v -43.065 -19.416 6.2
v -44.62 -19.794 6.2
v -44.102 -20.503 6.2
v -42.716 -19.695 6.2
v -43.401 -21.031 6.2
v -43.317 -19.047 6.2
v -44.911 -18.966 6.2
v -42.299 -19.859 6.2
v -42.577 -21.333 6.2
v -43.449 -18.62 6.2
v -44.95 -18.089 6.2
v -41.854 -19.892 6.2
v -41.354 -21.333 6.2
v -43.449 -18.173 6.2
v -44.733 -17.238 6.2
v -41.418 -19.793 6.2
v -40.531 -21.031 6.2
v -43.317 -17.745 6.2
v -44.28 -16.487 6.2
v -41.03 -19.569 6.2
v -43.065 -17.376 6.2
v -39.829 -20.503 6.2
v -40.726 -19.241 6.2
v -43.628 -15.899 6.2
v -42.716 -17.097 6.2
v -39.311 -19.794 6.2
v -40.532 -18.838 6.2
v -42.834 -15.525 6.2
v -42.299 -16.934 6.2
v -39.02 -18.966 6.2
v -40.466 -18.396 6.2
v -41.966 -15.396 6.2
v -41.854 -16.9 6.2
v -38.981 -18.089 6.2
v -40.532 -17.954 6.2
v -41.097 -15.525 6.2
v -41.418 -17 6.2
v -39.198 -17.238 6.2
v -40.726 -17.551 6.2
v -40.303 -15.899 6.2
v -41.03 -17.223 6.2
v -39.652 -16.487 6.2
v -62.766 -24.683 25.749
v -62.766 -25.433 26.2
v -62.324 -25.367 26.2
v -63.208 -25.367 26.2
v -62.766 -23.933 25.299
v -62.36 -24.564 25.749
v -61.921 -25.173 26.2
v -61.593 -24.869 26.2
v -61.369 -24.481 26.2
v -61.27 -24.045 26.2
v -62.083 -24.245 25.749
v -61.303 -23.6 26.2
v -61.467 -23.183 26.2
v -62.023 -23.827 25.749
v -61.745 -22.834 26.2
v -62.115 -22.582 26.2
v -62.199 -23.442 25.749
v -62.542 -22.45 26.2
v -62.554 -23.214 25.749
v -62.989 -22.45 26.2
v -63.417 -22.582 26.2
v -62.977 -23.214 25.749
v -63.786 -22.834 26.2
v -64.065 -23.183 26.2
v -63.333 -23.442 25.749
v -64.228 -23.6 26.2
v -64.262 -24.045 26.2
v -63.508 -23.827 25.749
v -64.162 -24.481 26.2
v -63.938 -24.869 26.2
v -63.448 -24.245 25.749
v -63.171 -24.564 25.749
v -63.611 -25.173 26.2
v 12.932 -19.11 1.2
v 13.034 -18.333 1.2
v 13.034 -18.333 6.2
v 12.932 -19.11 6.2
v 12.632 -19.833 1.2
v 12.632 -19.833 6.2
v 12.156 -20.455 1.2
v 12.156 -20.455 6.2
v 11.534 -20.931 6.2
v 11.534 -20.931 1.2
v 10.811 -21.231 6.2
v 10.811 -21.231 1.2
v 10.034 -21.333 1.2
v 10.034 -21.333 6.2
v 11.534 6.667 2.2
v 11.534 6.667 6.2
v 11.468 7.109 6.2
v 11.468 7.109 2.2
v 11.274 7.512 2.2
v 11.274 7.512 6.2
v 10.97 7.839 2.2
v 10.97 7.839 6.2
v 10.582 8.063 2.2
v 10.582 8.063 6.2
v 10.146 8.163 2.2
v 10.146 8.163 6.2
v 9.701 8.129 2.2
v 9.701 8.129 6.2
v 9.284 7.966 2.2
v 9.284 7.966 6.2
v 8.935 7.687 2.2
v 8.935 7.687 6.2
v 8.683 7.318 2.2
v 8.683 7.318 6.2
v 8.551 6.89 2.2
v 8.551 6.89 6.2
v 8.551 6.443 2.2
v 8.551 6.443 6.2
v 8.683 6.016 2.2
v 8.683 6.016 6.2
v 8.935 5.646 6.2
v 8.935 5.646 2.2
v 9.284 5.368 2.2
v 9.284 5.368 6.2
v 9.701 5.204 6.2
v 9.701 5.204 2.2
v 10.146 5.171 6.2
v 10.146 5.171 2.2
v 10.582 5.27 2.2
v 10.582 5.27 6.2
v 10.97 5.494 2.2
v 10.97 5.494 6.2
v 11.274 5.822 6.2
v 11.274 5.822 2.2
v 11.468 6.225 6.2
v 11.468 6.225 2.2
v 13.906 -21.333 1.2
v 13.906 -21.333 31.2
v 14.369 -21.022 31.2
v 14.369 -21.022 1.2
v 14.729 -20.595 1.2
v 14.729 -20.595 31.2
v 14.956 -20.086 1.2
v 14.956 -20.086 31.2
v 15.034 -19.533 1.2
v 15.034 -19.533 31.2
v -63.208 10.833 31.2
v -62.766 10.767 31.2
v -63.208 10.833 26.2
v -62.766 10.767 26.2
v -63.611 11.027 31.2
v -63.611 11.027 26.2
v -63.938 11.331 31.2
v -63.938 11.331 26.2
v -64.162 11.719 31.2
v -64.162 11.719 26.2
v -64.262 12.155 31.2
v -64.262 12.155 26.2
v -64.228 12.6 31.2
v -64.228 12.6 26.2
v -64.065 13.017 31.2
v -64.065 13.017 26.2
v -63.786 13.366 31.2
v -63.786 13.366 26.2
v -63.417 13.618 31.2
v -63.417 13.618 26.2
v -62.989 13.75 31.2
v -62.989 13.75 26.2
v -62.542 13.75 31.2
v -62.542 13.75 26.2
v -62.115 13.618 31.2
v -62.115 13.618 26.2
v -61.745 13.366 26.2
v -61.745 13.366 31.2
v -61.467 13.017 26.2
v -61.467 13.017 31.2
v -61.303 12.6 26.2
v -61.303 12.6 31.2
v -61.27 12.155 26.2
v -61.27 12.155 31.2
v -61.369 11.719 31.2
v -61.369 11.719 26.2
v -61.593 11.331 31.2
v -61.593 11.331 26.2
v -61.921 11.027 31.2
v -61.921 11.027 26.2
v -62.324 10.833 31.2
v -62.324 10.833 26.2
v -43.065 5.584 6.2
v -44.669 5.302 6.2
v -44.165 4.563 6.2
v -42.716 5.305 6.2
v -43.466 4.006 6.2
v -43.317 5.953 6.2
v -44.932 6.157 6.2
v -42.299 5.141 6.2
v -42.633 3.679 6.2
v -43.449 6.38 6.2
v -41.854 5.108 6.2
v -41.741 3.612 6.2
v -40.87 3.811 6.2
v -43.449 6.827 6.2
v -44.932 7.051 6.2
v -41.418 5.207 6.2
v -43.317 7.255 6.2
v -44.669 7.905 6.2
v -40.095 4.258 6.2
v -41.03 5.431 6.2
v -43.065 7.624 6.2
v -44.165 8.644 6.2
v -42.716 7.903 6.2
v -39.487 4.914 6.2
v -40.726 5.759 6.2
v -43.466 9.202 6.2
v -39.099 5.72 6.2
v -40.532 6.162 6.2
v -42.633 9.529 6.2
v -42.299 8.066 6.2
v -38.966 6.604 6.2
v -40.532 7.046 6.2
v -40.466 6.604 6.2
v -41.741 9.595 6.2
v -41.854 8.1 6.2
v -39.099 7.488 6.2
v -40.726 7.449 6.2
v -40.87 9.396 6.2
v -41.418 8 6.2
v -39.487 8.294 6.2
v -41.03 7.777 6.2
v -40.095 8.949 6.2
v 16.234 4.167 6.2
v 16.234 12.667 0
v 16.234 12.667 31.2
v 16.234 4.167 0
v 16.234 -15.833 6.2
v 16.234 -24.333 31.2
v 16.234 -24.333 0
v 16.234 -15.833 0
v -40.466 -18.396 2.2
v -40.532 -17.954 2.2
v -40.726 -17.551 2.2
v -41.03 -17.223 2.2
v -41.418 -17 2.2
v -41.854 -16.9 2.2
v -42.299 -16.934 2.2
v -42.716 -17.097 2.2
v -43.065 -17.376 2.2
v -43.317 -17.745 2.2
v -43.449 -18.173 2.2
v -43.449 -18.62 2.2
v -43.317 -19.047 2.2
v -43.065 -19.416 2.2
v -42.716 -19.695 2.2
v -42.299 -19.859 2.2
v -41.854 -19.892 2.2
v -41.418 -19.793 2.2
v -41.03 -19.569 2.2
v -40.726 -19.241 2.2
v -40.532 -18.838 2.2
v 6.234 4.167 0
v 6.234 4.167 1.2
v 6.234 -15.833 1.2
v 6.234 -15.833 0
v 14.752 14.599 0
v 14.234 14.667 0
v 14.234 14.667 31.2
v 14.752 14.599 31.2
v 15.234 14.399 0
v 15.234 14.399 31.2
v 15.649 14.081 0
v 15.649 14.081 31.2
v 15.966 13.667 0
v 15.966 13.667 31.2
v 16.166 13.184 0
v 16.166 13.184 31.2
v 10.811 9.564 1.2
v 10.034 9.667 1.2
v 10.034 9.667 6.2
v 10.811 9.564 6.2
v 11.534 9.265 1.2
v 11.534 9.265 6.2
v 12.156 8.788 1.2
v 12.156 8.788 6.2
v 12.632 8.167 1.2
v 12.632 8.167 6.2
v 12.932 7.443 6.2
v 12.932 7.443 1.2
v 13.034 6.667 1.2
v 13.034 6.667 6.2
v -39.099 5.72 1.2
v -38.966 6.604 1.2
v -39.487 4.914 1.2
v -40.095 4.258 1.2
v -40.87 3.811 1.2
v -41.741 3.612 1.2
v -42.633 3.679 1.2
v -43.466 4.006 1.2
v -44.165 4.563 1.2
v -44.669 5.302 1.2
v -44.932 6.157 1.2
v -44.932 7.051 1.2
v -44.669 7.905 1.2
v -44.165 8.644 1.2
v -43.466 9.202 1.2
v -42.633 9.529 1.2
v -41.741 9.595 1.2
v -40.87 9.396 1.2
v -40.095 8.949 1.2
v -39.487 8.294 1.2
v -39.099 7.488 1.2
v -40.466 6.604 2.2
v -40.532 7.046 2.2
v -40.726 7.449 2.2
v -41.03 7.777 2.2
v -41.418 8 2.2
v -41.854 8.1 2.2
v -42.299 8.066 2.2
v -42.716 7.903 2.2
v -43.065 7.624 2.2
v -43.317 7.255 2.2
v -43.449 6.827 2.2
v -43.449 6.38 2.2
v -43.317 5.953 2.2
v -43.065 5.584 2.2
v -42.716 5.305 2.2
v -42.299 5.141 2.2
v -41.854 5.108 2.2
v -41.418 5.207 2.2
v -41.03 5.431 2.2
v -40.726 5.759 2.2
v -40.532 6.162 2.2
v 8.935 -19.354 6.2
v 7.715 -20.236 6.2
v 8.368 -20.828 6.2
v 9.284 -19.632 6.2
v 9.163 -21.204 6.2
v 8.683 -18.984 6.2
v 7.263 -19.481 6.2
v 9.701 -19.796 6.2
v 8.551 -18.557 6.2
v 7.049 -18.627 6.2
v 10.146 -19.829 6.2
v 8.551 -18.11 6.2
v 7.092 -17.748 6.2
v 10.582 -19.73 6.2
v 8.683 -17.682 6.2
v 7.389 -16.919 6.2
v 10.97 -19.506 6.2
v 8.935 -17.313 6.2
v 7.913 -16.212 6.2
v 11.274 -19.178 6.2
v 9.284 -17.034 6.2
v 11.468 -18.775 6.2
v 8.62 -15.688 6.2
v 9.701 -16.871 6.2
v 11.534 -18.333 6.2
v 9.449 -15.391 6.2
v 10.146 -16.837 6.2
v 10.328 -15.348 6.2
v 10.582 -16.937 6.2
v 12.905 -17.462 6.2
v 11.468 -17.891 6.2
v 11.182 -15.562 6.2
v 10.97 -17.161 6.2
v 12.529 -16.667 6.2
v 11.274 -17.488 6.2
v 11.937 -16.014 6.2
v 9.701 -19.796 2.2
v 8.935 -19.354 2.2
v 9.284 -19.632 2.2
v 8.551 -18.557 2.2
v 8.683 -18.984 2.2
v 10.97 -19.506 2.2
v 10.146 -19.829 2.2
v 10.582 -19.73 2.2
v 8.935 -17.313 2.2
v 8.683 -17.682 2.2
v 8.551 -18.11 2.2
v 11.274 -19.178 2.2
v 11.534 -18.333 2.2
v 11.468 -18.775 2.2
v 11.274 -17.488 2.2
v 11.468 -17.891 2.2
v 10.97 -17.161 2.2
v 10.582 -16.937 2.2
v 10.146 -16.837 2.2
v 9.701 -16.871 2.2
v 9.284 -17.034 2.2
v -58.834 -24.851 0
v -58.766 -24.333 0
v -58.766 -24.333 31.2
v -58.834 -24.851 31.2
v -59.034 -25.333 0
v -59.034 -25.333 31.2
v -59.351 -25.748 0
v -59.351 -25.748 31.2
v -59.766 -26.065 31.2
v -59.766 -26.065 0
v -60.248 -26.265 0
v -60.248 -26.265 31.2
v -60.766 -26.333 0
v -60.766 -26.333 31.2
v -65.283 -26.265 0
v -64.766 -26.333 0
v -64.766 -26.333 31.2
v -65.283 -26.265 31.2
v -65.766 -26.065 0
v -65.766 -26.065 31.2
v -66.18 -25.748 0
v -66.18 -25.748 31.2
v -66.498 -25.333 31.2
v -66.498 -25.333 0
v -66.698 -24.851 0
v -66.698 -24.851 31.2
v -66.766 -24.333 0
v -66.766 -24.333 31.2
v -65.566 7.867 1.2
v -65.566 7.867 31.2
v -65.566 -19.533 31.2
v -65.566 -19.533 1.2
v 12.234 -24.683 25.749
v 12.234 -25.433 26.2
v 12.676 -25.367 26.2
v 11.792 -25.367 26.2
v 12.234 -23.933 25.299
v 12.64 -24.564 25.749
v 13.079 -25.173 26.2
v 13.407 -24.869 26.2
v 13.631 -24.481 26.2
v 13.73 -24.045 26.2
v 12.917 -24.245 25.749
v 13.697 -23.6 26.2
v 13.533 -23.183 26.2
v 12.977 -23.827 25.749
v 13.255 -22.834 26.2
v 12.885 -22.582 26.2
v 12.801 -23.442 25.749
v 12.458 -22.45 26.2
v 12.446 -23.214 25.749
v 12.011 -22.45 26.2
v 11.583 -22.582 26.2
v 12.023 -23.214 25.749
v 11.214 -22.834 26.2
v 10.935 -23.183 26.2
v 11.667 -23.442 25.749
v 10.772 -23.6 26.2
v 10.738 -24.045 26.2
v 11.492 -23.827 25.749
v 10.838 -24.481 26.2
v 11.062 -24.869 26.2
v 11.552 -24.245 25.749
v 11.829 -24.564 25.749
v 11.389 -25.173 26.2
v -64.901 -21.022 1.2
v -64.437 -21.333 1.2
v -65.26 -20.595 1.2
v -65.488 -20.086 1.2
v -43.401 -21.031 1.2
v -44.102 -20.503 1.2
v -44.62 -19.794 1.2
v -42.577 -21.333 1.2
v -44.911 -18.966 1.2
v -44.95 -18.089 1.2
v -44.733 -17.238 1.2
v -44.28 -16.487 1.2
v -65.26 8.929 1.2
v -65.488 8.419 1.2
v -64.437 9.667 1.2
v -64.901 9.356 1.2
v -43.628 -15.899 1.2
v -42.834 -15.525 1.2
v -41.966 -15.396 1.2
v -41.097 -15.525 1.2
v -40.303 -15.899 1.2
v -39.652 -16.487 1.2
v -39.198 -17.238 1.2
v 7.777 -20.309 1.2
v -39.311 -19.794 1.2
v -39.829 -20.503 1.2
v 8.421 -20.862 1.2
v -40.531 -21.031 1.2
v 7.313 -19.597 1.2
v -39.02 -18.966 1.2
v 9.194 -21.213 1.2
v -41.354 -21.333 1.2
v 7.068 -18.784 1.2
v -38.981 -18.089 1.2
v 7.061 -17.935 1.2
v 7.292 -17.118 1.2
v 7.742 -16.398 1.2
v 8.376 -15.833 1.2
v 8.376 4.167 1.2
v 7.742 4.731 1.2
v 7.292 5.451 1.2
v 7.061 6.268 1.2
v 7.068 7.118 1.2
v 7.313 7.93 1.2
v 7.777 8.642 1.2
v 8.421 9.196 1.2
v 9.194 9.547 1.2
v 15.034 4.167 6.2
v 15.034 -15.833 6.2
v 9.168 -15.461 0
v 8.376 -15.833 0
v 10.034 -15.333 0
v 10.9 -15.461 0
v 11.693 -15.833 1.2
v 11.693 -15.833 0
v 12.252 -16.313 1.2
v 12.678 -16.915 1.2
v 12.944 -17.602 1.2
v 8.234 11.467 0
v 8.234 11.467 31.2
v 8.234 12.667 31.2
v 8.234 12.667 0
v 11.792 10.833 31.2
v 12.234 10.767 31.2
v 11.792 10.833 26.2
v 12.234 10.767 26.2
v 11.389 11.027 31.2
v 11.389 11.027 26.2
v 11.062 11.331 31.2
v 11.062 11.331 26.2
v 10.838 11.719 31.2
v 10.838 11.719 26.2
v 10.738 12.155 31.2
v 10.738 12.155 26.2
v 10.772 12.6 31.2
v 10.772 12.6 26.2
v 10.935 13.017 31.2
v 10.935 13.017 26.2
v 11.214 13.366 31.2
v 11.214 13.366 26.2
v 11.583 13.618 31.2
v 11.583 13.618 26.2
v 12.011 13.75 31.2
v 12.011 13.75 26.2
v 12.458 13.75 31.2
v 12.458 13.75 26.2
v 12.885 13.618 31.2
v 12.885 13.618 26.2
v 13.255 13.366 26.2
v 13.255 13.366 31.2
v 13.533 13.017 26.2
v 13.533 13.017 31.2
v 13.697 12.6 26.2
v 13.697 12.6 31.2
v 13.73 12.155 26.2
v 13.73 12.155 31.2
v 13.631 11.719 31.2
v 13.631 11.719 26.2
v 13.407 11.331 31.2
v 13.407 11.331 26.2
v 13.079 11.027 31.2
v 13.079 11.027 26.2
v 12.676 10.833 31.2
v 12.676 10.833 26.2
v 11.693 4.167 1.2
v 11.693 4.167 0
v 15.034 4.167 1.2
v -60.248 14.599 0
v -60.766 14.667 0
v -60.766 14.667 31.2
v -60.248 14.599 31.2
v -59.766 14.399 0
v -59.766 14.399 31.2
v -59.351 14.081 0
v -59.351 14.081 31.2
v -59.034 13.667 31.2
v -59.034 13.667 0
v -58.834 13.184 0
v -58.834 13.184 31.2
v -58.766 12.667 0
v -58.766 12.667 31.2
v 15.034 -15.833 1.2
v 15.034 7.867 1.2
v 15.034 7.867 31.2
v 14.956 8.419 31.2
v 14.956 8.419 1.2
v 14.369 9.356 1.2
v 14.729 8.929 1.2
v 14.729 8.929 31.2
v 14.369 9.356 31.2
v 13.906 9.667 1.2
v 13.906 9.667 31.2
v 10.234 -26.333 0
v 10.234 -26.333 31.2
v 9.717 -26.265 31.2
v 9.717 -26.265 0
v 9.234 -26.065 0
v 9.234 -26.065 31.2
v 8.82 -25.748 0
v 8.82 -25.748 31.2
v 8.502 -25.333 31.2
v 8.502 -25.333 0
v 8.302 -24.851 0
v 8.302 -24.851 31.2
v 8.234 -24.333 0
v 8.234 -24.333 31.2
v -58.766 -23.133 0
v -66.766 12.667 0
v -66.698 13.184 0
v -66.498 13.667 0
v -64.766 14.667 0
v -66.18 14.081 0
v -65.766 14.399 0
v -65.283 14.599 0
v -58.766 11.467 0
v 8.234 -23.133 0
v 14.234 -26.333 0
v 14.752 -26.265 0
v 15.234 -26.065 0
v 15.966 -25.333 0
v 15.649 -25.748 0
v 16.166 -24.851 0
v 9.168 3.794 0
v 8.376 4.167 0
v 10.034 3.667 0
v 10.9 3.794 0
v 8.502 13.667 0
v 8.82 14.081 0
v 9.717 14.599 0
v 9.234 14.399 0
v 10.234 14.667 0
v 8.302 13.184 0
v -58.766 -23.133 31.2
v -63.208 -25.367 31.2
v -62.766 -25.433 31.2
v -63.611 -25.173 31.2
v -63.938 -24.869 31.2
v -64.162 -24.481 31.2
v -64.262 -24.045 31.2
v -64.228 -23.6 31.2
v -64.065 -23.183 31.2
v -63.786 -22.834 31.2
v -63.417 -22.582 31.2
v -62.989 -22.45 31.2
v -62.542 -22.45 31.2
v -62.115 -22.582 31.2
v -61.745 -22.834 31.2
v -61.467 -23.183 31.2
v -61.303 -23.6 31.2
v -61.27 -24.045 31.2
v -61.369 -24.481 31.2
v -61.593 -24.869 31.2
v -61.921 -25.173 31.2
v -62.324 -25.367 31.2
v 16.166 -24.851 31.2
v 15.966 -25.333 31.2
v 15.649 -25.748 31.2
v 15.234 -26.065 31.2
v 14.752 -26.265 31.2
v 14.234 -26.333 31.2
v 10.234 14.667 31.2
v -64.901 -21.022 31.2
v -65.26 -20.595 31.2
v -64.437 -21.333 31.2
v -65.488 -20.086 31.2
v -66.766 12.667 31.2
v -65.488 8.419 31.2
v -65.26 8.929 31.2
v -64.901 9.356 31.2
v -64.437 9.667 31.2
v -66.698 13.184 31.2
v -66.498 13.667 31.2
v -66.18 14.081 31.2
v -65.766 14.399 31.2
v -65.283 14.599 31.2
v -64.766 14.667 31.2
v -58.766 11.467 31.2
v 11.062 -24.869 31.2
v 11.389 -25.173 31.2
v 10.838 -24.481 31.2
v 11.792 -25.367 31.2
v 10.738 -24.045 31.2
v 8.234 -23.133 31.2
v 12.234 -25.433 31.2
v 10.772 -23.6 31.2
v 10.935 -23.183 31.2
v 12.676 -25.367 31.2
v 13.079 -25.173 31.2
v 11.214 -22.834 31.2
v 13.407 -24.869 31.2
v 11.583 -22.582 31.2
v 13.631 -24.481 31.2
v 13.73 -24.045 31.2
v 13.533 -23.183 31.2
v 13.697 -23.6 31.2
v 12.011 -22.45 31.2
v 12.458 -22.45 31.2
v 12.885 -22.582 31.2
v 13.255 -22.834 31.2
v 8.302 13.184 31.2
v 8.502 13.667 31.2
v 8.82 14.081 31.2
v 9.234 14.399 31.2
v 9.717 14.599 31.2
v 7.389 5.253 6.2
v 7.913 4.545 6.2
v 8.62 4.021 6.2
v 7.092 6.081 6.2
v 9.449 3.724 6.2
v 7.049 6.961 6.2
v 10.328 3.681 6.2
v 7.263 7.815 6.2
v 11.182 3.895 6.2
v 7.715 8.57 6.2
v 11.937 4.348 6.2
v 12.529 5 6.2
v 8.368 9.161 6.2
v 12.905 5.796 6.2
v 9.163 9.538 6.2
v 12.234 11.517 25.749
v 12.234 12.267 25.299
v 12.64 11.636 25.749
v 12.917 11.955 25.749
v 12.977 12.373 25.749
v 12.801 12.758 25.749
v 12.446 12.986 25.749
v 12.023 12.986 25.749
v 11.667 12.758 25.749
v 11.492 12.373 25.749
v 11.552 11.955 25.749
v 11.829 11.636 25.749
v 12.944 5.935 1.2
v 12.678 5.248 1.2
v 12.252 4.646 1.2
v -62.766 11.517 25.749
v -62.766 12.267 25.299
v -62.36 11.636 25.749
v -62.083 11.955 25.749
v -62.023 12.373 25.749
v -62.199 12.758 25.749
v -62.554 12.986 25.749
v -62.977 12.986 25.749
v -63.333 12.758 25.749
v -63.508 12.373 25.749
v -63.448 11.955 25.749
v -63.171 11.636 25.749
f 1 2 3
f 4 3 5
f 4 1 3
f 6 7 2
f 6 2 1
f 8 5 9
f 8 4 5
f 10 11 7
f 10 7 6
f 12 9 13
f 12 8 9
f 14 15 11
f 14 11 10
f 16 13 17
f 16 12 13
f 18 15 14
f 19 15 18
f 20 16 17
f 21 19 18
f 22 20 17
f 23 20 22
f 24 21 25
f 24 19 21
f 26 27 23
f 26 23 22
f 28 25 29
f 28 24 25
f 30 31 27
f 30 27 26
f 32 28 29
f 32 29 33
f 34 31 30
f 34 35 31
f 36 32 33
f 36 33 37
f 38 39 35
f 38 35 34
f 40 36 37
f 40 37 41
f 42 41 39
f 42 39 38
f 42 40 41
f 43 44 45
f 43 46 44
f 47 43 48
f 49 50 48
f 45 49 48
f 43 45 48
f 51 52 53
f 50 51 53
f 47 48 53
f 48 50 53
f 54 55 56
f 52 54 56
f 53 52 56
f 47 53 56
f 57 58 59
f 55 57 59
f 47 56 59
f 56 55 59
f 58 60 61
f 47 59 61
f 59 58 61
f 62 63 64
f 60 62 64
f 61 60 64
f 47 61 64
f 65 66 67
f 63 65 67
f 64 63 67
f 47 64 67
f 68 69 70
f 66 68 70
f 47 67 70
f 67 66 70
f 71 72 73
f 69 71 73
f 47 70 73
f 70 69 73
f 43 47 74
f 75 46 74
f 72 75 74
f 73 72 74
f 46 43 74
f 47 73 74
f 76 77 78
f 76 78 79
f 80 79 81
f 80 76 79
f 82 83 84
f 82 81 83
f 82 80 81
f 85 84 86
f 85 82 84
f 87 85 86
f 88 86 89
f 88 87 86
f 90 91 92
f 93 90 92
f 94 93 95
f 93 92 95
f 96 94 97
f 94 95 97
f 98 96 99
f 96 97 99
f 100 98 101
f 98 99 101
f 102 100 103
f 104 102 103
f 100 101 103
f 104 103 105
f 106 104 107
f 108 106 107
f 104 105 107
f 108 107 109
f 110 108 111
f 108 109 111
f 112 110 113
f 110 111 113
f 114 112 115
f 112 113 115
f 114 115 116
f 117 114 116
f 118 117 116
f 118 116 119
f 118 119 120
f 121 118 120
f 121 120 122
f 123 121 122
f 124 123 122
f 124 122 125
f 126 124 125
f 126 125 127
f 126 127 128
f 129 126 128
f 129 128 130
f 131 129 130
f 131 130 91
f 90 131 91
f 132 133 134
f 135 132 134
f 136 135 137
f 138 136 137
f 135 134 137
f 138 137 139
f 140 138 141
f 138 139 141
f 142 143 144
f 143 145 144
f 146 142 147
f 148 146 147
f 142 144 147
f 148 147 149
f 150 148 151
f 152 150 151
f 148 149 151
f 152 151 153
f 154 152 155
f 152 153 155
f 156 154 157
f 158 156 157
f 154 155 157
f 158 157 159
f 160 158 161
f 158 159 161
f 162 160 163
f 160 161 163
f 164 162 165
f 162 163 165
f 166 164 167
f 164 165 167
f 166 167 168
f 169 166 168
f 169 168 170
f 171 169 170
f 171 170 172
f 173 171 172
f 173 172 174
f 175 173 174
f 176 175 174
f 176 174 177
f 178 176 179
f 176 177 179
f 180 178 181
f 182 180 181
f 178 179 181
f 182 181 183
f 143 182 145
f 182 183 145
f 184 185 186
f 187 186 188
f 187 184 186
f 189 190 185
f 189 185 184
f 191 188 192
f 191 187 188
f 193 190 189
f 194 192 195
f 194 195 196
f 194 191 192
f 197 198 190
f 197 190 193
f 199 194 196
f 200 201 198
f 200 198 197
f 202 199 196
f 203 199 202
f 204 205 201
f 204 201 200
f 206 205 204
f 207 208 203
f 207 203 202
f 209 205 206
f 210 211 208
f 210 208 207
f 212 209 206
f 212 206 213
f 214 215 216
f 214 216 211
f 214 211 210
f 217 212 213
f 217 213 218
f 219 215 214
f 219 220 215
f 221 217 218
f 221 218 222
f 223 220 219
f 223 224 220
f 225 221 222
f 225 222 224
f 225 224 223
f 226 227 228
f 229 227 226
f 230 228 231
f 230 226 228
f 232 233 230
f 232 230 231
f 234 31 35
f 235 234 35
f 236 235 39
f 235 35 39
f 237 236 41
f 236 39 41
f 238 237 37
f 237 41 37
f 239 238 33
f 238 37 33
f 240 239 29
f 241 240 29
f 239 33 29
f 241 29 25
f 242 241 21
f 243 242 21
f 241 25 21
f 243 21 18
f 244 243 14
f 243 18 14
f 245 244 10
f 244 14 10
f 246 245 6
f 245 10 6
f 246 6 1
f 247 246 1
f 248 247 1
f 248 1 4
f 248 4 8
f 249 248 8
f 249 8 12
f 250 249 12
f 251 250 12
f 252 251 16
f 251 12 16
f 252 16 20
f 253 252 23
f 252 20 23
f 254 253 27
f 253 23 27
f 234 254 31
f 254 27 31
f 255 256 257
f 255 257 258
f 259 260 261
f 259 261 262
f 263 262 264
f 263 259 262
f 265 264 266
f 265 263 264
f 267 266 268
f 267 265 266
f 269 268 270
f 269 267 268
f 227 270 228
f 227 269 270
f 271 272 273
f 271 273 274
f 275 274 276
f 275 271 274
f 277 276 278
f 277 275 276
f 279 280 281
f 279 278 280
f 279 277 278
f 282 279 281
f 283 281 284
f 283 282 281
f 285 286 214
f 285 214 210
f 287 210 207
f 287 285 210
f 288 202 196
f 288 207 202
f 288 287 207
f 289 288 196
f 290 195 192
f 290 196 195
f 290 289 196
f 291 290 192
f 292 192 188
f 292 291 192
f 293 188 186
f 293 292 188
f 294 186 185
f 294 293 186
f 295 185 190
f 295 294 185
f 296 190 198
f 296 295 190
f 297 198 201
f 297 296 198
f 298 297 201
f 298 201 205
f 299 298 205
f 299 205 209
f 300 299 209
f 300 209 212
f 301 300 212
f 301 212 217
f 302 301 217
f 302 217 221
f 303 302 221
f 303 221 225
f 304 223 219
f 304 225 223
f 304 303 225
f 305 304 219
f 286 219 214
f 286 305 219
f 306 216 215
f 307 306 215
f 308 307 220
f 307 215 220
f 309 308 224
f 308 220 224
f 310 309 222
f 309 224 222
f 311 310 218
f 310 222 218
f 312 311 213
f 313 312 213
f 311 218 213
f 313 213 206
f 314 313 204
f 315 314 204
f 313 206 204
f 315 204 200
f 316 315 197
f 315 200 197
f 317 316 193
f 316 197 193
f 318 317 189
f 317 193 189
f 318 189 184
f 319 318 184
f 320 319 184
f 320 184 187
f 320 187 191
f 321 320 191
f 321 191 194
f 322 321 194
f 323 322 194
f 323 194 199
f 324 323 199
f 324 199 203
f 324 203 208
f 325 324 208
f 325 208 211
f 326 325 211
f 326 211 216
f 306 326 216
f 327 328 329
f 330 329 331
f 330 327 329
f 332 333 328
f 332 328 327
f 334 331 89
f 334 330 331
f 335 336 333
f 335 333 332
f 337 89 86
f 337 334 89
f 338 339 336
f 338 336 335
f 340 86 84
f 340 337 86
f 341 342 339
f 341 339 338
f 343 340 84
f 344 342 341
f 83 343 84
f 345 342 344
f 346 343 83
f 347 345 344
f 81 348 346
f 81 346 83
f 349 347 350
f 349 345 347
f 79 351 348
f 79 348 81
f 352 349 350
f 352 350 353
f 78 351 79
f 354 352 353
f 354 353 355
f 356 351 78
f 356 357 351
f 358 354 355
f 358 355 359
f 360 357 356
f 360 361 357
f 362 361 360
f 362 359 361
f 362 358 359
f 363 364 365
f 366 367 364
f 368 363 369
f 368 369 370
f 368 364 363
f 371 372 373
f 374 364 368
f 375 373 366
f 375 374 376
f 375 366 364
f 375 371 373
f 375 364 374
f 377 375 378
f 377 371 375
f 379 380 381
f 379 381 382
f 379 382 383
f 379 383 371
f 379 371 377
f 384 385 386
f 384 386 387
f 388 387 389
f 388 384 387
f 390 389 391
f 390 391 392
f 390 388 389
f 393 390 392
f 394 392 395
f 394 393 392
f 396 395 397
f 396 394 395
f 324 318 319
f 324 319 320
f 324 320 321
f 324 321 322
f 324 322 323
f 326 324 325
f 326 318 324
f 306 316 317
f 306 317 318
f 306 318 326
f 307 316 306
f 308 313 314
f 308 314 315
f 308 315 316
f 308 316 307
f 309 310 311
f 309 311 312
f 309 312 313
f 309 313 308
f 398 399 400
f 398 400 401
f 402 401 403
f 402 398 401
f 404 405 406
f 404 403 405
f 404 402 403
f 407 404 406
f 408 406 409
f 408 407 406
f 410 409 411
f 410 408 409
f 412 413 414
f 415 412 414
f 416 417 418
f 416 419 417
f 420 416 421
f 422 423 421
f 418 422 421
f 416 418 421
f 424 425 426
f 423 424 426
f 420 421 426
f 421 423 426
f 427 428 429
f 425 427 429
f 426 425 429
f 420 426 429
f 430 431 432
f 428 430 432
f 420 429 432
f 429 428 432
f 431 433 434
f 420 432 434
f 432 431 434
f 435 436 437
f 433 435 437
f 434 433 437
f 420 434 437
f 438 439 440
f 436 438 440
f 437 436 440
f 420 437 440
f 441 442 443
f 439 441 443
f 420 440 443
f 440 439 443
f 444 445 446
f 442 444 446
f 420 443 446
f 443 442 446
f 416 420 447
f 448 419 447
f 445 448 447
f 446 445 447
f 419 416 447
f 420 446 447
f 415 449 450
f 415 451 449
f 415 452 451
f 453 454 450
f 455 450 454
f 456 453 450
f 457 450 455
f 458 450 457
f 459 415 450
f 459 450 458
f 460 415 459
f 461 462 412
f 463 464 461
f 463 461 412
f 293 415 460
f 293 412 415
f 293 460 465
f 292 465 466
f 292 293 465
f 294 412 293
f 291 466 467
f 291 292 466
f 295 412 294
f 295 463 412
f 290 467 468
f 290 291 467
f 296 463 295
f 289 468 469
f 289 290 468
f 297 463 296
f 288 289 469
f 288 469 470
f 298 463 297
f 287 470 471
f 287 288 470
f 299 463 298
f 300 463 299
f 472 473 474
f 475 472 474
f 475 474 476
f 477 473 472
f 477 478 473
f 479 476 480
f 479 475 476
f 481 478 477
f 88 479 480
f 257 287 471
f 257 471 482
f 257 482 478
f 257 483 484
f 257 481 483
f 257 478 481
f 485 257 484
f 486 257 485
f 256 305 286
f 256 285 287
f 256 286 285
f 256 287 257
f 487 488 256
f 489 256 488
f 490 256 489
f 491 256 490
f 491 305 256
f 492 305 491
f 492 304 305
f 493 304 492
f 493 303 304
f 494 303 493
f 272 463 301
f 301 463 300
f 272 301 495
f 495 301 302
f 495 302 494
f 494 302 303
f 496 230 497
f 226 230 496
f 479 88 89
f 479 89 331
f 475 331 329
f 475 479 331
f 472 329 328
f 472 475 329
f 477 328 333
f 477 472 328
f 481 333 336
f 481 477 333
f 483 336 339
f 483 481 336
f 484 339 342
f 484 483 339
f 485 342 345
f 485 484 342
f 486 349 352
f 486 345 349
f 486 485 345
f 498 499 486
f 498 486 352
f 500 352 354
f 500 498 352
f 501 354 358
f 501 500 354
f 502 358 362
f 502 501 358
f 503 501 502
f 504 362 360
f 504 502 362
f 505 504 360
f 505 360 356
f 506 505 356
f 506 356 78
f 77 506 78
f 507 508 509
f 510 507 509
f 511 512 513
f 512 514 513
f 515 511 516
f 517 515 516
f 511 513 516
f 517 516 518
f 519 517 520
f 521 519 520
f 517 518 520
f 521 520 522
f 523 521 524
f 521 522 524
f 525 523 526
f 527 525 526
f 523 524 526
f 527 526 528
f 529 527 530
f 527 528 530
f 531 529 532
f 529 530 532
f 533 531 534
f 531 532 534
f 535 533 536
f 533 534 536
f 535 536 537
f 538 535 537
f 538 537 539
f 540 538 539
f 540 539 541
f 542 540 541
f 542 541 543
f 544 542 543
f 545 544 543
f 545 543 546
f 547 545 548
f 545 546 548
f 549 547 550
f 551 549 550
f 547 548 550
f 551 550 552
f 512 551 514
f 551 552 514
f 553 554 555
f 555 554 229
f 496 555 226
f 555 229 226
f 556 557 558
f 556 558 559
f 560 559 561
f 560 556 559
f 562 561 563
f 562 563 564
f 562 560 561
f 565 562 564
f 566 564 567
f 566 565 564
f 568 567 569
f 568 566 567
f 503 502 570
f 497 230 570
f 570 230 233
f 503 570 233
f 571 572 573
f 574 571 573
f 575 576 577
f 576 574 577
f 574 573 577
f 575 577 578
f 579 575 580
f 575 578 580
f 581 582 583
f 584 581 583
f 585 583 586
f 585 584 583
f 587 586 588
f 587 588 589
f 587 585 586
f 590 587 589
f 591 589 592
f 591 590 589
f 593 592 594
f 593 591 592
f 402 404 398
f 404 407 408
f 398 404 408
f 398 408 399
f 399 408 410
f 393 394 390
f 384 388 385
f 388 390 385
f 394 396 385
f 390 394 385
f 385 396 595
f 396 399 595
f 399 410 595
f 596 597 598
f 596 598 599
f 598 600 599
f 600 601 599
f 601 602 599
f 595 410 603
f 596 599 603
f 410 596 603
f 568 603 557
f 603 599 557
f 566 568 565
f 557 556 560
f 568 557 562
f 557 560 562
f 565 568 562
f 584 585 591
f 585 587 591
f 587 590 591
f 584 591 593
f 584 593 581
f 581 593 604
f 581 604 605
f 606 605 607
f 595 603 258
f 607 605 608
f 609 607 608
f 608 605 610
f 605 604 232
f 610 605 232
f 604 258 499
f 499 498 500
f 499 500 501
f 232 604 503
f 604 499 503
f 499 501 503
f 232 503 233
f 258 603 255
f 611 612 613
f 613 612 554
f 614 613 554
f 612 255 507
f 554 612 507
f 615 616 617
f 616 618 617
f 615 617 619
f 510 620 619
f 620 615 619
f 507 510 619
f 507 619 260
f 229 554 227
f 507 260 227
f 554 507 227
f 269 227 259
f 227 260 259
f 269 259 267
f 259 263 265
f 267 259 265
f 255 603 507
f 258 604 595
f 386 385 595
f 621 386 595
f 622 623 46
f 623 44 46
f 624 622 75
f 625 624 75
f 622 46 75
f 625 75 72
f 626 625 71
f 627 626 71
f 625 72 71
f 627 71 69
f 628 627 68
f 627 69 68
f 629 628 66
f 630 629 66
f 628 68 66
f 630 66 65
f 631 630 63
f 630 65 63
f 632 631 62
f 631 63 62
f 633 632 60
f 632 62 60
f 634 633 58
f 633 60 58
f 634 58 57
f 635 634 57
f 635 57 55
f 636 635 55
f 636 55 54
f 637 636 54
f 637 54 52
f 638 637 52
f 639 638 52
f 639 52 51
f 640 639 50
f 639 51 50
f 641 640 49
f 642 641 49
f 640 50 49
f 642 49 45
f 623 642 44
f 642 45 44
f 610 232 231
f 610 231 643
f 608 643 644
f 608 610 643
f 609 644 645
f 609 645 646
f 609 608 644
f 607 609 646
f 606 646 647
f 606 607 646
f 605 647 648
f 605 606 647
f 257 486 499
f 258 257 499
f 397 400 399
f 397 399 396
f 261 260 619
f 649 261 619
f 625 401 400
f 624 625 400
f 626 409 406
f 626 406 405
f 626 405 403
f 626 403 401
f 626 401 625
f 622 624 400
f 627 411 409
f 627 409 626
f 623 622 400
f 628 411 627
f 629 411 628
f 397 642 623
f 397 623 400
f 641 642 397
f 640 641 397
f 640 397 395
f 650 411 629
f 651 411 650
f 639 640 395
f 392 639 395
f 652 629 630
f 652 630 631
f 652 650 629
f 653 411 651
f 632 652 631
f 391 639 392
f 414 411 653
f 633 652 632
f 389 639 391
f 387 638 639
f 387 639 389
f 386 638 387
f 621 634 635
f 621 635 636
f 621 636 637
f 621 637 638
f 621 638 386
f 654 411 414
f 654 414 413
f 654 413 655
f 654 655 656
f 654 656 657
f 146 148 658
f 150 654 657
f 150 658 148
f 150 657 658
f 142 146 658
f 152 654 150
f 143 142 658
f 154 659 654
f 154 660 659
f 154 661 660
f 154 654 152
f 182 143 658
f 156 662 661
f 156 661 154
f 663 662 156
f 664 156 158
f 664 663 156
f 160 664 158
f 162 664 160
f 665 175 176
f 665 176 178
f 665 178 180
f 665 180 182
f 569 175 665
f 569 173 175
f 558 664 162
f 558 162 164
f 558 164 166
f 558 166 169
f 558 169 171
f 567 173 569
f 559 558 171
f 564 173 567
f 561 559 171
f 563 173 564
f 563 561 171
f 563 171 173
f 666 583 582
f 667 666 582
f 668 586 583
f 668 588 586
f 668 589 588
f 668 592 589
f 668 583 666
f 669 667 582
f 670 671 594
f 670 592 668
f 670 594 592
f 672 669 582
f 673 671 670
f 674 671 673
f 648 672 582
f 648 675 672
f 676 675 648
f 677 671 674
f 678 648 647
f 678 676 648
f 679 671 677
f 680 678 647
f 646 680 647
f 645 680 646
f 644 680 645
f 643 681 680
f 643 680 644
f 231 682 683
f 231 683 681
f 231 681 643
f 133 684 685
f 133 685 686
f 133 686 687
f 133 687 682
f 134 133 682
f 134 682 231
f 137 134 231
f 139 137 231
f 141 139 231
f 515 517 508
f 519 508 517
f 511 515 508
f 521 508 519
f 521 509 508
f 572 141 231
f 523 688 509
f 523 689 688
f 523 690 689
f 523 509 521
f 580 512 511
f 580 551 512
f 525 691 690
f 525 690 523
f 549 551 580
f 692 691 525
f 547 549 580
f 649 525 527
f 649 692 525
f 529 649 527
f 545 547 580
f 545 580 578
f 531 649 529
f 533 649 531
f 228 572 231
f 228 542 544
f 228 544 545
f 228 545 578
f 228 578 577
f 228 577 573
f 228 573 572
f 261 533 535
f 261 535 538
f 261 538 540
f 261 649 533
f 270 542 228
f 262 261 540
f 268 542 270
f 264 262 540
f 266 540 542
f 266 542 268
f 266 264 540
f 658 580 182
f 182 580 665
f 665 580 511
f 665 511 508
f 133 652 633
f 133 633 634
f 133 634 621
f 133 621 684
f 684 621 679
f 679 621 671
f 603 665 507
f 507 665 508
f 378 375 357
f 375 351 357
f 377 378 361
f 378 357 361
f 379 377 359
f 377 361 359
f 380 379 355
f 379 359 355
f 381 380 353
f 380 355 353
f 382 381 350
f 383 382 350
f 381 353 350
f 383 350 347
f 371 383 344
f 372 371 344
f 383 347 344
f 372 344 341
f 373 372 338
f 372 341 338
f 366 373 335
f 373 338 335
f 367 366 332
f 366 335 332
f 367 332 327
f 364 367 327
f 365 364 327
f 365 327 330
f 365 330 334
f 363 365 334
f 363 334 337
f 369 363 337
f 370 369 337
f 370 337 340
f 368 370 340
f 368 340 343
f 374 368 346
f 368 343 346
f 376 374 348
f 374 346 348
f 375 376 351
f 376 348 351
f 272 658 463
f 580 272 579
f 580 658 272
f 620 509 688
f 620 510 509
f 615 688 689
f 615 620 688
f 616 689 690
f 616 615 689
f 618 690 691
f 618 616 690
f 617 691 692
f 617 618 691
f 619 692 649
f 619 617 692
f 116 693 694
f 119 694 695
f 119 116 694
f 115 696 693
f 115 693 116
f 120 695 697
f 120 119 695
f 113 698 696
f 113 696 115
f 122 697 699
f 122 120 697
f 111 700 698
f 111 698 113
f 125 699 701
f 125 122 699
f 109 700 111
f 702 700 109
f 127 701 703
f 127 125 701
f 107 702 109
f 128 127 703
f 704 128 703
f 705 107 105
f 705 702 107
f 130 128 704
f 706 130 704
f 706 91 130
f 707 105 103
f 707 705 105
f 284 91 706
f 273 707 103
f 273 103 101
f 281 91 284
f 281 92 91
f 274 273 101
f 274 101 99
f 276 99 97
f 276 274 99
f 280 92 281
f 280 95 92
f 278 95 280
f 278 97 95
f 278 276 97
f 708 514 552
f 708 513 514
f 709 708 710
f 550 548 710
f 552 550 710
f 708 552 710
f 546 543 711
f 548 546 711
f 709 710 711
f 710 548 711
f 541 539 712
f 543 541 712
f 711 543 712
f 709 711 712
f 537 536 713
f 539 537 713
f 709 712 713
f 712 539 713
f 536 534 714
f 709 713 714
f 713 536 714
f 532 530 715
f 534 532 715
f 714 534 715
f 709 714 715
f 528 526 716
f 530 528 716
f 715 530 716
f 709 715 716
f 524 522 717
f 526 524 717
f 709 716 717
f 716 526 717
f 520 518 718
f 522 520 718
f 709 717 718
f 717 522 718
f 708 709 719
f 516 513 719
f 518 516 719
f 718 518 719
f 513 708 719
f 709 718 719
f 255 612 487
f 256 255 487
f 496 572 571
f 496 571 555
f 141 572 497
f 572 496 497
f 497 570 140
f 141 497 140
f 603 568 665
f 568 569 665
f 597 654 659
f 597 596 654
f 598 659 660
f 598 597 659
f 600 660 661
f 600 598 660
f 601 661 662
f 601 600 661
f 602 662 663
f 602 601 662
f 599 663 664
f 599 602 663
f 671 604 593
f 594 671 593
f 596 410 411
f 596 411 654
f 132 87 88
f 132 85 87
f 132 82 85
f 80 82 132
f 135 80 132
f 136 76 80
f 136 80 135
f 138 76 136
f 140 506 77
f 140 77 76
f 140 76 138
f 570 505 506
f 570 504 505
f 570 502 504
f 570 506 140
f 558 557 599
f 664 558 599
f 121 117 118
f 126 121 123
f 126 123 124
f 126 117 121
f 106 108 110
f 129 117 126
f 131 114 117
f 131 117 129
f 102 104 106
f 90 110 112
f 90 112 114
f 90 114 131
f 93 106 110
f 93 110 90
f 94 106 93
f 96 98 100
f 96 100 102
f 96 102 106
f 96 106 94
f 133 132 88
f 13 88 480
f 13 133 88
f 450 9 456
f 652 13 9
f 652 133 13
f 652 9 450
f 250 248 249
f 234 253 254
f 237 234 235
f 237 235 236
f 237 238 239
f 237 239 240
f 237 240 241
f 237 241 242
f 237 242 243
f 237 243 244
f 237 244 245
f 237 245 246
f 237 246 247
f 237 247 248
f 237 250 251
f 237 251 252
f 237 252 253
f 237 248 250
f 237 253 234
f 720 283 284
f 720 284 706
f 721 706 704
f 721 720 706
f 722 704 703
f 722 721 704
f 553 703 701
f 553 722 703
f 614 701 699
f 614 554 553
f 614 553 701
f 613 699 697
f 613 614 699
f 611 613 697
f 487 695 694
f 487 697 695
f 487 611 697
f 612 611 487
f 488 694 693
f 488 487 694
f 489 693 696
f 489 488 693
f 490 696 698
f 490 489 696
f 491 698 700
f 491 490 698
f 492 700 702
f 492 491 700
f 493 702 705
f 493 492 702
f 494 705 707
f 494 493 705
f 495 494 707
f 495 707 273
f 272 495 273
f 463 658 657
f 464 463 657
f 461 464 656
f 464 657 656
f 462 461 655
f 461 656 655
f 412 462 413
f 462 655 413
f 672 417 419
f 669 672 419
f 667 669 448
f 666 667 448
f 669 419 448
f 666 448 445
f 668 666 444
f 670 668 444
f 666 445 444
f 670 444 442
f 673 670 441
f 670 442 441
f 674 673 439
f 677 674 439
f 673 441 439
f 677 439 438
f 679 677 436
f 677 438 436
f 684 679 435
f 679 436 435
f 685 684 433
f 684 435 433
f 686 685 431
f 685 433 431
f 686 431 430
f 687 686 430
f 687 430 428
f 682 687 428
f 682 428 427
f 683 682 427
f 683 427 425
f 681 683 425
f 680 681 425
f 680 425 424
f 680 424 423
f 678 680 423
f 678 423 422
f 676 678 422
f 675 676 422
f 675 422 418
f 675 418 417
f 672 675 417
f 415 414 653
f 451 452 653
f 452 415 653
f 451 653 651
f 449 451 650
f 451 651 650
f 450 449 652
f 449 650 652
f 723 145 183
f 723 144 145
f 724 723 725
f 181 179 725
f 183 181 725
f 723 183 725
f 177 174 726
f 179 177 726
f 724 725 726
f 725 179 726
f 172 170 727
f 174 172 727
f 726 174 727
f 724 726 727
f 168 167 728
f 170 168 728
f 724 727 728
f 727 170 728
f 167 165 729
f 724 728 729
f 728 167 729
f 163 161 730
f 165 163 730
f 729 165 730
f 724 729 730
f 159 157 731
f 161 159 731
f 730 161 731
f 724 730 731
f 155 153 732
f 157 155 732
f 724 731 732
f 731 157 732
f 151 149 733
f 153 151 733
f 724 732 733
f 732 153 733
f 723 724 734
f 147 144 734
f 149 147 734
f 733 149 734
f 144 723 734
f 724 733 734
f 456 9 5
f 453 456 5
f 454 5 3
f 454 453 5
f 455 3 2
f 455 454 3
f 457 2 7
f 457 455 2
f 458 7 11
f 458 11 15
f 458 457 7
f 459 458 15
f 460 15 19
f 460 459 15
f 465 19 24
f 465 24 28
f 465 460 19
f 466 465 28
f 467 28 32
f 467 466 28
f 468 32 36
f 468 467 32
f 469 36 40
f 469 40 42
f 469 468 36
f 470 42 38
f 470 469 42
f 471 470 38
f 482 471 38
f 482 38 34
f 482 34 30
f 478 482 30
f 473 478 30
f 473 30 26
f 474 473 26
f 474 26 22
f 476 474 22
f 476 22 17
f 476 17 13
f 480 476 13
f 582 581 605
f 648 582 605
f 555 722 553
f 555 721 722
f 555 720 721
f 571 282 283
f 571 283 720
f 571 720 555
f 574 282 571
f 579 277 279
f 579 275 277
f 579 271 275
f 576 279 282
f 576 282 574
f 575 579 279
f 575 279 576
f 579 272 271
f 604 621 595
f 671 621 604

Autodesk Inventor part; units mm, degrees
ref_plane "YZ Plane" through (0, 0, 0) normal (1, 0, 0) x (0, 1, 0)
ref_plane "XZ Plane" through (0, 0, 0) normal (0, 1, 0) x (-1, 0, 0)
ref_plane "XY Plane" through (0, 0, 0) normal (0, 0, 1) x (1, 0, 0)
sketch "Sketch1" plane through (0, 0, 0) normal (0, 0, 1) x (1, 0, 0)
  line L0 (-66.7657, 11.6667) -> (16.2343, 11.6667)
  line L1 (16.2343, 11.6667) -> (16.2343, -23.3333)
  line L2 (16.2343, -23.3333) -> (-66.7657, -23.3333)
  line L3 (-66.7657, -23.3333) -> (-66.7657, 11.6667)
  point P0 (0, 0)
  dimension "d0" = 35
  dimension "d1" = 83
extrude "Extrusion1" add sketch "Sketch1" along normal blind 1.2
sketch "Sketch2" plane through (0, 0, 1.2) normal (0, 0, 1) x (1, 0, 0)
  line L0 (16.2343, -23.3333) -> (16.2343, 11.6667) projected
  line L1 (-66.7657, 11.6667) -> (16.2343, 11.6667)
  line L2 (16.2343, 11.6667) -> (16.2343, 9.8667)
  line L3 (16.2343, 9.8667) -> (-66.7657, 9.8667)
  line L4 (-66.7657, 9.8667) -> (-66.7657, 11.6667)
  line L5 (-66.7657, 11.6667) -> (-66.7657, -23.3333) projected
  line L6 (16.2343, -23.3333) -> (-66.7657, -23.3333)
  line L7 (-66.7657, -23.3333) -> (-66.7657, -21.5333)
  line L8 (-66.7657, -21.5333) -> (16.2343, -21.5333)
  line L9 (16.2343, -21.5333) -> (16.2343, -23.3333)
  line L10 (-66.7657, 9.8667) -> (-65.5657, 9.8667)
  line L11 (-65.5657, 9.8667) -> (-65.5657, -21.5333)
  line L12 (-65.5657, -21.5333) -> (-66.7657, -21.5333)
  line L13 (-66.7657, -21.5333) -> (-66.7657, 9.8667)
  line L14 (16.2343, 9.8667) -> (15.0343, 9.8667)
  line L15 (15.0343, 9.8667) -> (15.0343, -21.5333)
  line L16 (15.0343, -21.5333) -> (16.2343, -21.5333)
  line L17 (16.2343, -21.5333) -> (16.2343, 9.8667)
  line L18 (-66.7657, 11.6667) -> (-65.5657, 11.6667)
  line L19 (-65.5657, 11.6667) -> (-65.5657, -21.5333)
  line L20 (-65.5657, -21.5333) -> (-66.7657, -21.5333)
  line L21 (-66.7657, -21.5333) -> (-66.7657, 11.6667)
  line L22 (-66.7657, 11.6667) -> (16.2343, 11.6667)
  line L23 (16.2343, 11.6667) -> (16.2343, 9.8667)
  line L24 (16.2343, 9.8667) -> (-66.7657, 9.8667)
  line L25 (-66.7657, 9.8667) -> (-66.7657, 11.6667)
  point P0 (0, 0)
  dimension "d4" = 1.8
  dimension "d5" = 1.8
  dimension "d6" = 1.2
  dimension "d7" = 1.2
extrude "Extrusion2" add sketch "Sketch2" along normal blind 30 contours L6 L5 L8 L0 | L8 L15 L3 L0 | L3 L19 L1 L0 | L5 L3 L11 L8 | L4 L1 L19 L3
sketch "Sketch3" plane through (0, 0, 31.2) normal (0, 0, 1) x (1, 0, 0)
  point P0 (0, 0)
sketch "Sketch4" plane through (16.2343, -23.3333, 0) normal (1, 0, 0) x (0, 0, -1)
  line L0 (-1.2, 33.2) -> (-1.2, 1.8) projected
  line L1 (-1.2, 7.5) -> (-6.2, 7.5)
  line L2 (-6.2, 7.5) -> (-6.2, 27.5)
  line L3 (-6.2, 27.5) -> (-1.2, 27.5)
  line L4 (-1.2, 27.5) -> (-1.2, 7.5)
  line L5 (-1.2, 1.8) -> (-31.2, 1.8) projected
  line L6 (-1.2, 33.2) -> (-31.2, 33.2) projected
  line L7 (-6.2, 7.5) -> (0, 7.5)
  line L8 (0, 7.5) -> (0, 27.5)
  line L9 (0, 27.5) -> (-6.2, 27.5)
  line L10 (-6.2, 27.5) -> (-6.2, 7.5)
  line L11 (0, 35) -> (0, 0) projected
  point P0 (0, 23.3333)
  dimension "d10" = 20
  dimension "d11" = 5
  dimension "d12" = 5.7
  dimension "d13" = 5.7
extrude "Extrusion3" cut sketch "Sketch4" against normal blind 10
fillet "Fillet1" radius 2 8 edges at (-66.7657, 11.6667, 15.6) (-65.5657, 9.8667, 16.2) (-66.7657, -23.3333, 15.6) (-65.5657, -21.5333, 16.2) (15.0343, 9.8667, 16.2) (16.2343, 11.6667, 15.6) (16.2343, -23.3333, 15.6) (15.0343, -21.5333, 16.2)
sketch "Sketch5" plane through (0, 0, 1.2) normal (0, 0, 1) x (1, 0, 0)
  circle A0 centre (10.0343, 6.6667) radius 1.5
  circle A1 centre (10.0343, -18.3333) radius 1.5
  line L0 (15.0343, 7.8667) -> (15.0343, -19.5333) projected
  line L1 (13.0343, -21.5333) -> (-63.5657, -21.5333) projected
  line L2 (-63.5657, 9.8667) -> (13.0343, 9.8667) projected
  point P0 (0, 0)
  dimension "d17" = 3
  dimension "d18" = 3
  dimension "d19" = 25
  dimension "d20" = 5
  dimension "d21" = 5
  dimension "d22" = 3.2
  dimension "d23" = 3.2
extrude "Extrusion4" add sketch "Sketch5" along normal blind 5
sketch "Sketch6" plane through (0, 0, 1.2) normal (0, 0, 1) x (1, 0, 0)
  circle A0 centre (-41.9656, -18.3962) radius 1.5
  circle A1 centre (-41.9656, 6.6038) radius 1.5
  circle A2 centre (10.0343, 6.6667) radius 1.5 projected
  circle A3 centre (10.0343, -18.3333) radius 1.5 projected
  point P0 (0, 0)
  dimension "d26" = 3
  dimension "d27" = 3
  dimension "d28" = 25
  dimension "d29" = 52
  dimension "d30" = 52
extrude "Extrusion5" add sketch "Sketch6" along normal blind 5 contours A0 | A1
sketch "Sketch7" plane through (-41.9656, 6.6038, 6.2) normal (0, 0, 1) x (1, 0, 0)
  point P0 (41.9656, -6.6038)
sketch "Sketch8" plane through (0, 0, 1.2) normal (0, 0, 1) x (1, 0, 0)
  circle A0 centre (-41.9656, -18.3962) radius 1.5 projected
  circle A1 centre (-41.9656, -18.3962) radius 3
  circle A2 centre (-41.9656, 6.6038) radius 1.5 projected
  circle A3 centre (-41.9656, 6.6038) radius 3
  circle A4 centre (10.0343, -18.3333) radius 1.5 projected
  circle A5 centre (10.0343, -18.3333) radius 3
  circle A6 centre (10.0343, 6.6667) radius 1.5 projected
  circle A7 centre (10.0343, 6.6667) radius 3
  point P0 (0, 0)
  dimension "d33" = 6
  dimension "d34" = 6
  dimension "d35" = 6
  dimension "d36" = 6
extrude "Extrusion6" add sketch "Sketch8" along normal blind 5
sketch "Sketch9" plane through (0, 0, 1.2) normal (0, 0, 1) x (1, 0, 0)
  arc A0 (8.376, -15.8333) -> (11.6926, -15.8333) centre (10.0343, -18.3333) ccw projected
  circle A1 centre (10.0343, -18.3333) radius 3
  arc A2 (11.6926, 4.1667) -> (8.376, 4.1667) centre (10.0343, 6.6667) ccw projected
  circle A3 centre (10.0343, 6.6667) radius 3
  point P0 (0, 0)
  dimension "d39" = 6
  dimension "d40" = 6
extrude "Extrusion7" add sketch "Sketch9" against normal blind 1.2
sketch "Sketch10" plane through (-41.9656, -18.3962, 6.2) normal (0, 0, 1) x (1, 0, 0)
  circle A0 centre (0, 0) radius 3 projected
  circle A1 centre (0, 0) radius 1.5
  circle A2 centre (0, 25) radius 3 projected
  circle A3 centre (0, 25) radius 1.5
  circle A4 centre (52, 0.0629) radius 3 projected
  circle A5 centre (52, 0.0629) radius 1.5
  circle A6 centre (52, 25.0629) radius 3 projected
  circle A7 centre (52, 25.0629) radius 1.5
  point P0 (41.9656, 18.3962)
  dimension "d43" = 3
  dimension "d44" = 3
  dimension "d45" = 3
  dimension "d46" = 3
extrude "Extrusion8" cut sketch "Sketch10" against normal blind 4 contours A1 | A3 | A5 | A7
thread "Thread1" size "M3x0.5" class "6H" standard "ANSI Metric M Profile" full length
thread "Thread2" size "M3x0.5" class "6H" standard "ANSI Metric M Profile" full length
thread "Thread3" size "M3x0.5" class "6H" standard "ANSI Metric M Profile" full length
thread "Thread4" size "M3x0.5" class "6H" standard "ANSI Metric M Profile" full length
sketch "Sketch11" plane through (0, 0, 31.2) normal (0, 0, 1) x (1, 0, 0)
  arc A0 (-64.7657, 11.6667) -> (-66.7657, 9.6667) centre (-64.7657, 9.6667) ccw projected
  line L0 (-66.7657, 9.6667) -> (16.2343, 9.6667)
  line L1 (16.2343, 9.6667) -> (16.2343, 14.6667)
  line L2 (16.2343, 14.6667) -> (-66.7657, 14.6667)
  line L3 (-66.7657, 14.6667) -> (-66.7657, 9.6667)
  line L4 (16.2343, -21.3333) -> (-66.7657, -21.3333)
  line L5 (-66.7657, -21.3333) -> (-66.7657, -26.3333)
  line L6 (-66.7657, -26.3333) -> (16.2343, -26.3333)
  line L7 (16.2343, -26.3333) -> (16.2343, -21.3333)
  point P0 (0, 0)
  dimension "d57" = 5
  dimension "d58" = 5
  dimension "d59" = 83
extrude "Extrusion9" add sketch "Sketch11" against normal blind 31.2
fillet "Fillet2" radius 2 4 edges at (16.2343, -26.3333, 15.6) (16.2343, 14.6667, 15.6) (-66.7657, 14.6667, 15.6) (-66.7657, -26.3333, 15.6)
sketch "Sketch12" plane through (0, 0, 31.2) normal (0, 0, 1) x (1, 0, 0)
  line L0 (14.2343, -26.3333) -> (-64.7657, -26.3333) projected
  line L1 (8.2343, -26.3333) -> (-58.7657, -26.3333)
  line L2 (-58.7657, -26.3333) -> (-58.7657, -23.1333)
  line L3 (-58.7657, -23.1333) -> (8.2343, -23.1333)
  line L4 (8.2343, -23.1333) -> (8.2343, -26.3333)
  line L5 (-64.7657, 14.6667) -> (14.2343, 14.6667) projected
  line L6 (8.2343, 14.6667) -> (-58.7657, 14.6667)
  line L7 (-58.7657, 14.6667) -> (-58.7657, 11.4667)
  line L8 (-58.7657, 11.4667) -> (8.2343, 11.4667)
  line L9 (8.2343, 11.4667) -> (8.2343, 14.6667)
  line L10 (16.2343, -24.3333) -> (16.2343, 12.6667) projected
  line L11 (-66.7657, 12.6667) -> (-66.7657, -24.3333) projected
  line L12 (13.9061, -21.3333) -> (-64.4375, -21.3333) projected
  line L13 (10.0343, 9.6667) -> (-64.4375, 9.6667) projected
  point P0 (0, 0)
  dimension "d63" = 8
  dimension "d64" = 8
  dimension "d65" = 1.8
  dimension "d66" = 1.8
extrude "Extrusion10" cut sketch "Sketch12" against normal blind 31.2
fillet "Fillet3" radius 2 4 edges at (8.2343, -26.3333, 15.6) (-58.7657, -26.3333, 15.6) (8.2343, 14.6667, 15.6) (-58.7657, 14.6667, 15.6)
sketch "Sketch13" plane through (0, 0, 31.2) normal (0, 0, 1) x (1, 0, 0)
  line L0 (14.2343, -26.3333) -> (10.2343, -26.3333) projected
  circle A0 centre (12.2343, -23.9333) radius 1.5
  circle A1 centre (-62.7657, -23.9333) radius 1.5
  line L1 (-64.7657, -26.3333) -> (-60.7657, -26.3333) projected
  circle A2 centre (12.2343, 12.2667) radius 1.5
  circle A3 centre (-62.7657, 12.2667) radius 1.5
  line L2 (-66.7657, 12.6667) -> (-66.7657, -24.3333) projected
  line L3 (-60.7657, 14.6667) -> (-64.7657, 14.6667) projected
  line L4 (16.2343, -24.3333) -> (16.2343, 12.6667) projected
  line L5 (14.2343, 14.6667) -> (10.2343, 14.6667) projected
  line L6 (8.2343, -23.1333) -> (8.2343, -24.3333) projected
  point P0 (0, 0)
  dimension "d70" = 2.4
  dimension "d71" = 3
  dimension "d72" = 3
  dimension "d73" = 2.4
  dimension "d74" = 3
  dimension "d75" = 3
  dimension "d76" = 4
  dimension "d77" = 4
  dimension "d78" = 2.4
  dimension "d79" = 4
  dimension "d80" = 2.4
  dimension "d81" = 4
hole "Hole1" at (12.2343, -23.9333, 31.2) at (12.2343, 12.2667, 31.2) at (-62.7657, -23.9333, 31.2) at (-62.7657, 12.2667, 31.2) direction (0, 0, -1) diameter 3 depth 5 tip angle 118
properties part number "Case Bottom"
